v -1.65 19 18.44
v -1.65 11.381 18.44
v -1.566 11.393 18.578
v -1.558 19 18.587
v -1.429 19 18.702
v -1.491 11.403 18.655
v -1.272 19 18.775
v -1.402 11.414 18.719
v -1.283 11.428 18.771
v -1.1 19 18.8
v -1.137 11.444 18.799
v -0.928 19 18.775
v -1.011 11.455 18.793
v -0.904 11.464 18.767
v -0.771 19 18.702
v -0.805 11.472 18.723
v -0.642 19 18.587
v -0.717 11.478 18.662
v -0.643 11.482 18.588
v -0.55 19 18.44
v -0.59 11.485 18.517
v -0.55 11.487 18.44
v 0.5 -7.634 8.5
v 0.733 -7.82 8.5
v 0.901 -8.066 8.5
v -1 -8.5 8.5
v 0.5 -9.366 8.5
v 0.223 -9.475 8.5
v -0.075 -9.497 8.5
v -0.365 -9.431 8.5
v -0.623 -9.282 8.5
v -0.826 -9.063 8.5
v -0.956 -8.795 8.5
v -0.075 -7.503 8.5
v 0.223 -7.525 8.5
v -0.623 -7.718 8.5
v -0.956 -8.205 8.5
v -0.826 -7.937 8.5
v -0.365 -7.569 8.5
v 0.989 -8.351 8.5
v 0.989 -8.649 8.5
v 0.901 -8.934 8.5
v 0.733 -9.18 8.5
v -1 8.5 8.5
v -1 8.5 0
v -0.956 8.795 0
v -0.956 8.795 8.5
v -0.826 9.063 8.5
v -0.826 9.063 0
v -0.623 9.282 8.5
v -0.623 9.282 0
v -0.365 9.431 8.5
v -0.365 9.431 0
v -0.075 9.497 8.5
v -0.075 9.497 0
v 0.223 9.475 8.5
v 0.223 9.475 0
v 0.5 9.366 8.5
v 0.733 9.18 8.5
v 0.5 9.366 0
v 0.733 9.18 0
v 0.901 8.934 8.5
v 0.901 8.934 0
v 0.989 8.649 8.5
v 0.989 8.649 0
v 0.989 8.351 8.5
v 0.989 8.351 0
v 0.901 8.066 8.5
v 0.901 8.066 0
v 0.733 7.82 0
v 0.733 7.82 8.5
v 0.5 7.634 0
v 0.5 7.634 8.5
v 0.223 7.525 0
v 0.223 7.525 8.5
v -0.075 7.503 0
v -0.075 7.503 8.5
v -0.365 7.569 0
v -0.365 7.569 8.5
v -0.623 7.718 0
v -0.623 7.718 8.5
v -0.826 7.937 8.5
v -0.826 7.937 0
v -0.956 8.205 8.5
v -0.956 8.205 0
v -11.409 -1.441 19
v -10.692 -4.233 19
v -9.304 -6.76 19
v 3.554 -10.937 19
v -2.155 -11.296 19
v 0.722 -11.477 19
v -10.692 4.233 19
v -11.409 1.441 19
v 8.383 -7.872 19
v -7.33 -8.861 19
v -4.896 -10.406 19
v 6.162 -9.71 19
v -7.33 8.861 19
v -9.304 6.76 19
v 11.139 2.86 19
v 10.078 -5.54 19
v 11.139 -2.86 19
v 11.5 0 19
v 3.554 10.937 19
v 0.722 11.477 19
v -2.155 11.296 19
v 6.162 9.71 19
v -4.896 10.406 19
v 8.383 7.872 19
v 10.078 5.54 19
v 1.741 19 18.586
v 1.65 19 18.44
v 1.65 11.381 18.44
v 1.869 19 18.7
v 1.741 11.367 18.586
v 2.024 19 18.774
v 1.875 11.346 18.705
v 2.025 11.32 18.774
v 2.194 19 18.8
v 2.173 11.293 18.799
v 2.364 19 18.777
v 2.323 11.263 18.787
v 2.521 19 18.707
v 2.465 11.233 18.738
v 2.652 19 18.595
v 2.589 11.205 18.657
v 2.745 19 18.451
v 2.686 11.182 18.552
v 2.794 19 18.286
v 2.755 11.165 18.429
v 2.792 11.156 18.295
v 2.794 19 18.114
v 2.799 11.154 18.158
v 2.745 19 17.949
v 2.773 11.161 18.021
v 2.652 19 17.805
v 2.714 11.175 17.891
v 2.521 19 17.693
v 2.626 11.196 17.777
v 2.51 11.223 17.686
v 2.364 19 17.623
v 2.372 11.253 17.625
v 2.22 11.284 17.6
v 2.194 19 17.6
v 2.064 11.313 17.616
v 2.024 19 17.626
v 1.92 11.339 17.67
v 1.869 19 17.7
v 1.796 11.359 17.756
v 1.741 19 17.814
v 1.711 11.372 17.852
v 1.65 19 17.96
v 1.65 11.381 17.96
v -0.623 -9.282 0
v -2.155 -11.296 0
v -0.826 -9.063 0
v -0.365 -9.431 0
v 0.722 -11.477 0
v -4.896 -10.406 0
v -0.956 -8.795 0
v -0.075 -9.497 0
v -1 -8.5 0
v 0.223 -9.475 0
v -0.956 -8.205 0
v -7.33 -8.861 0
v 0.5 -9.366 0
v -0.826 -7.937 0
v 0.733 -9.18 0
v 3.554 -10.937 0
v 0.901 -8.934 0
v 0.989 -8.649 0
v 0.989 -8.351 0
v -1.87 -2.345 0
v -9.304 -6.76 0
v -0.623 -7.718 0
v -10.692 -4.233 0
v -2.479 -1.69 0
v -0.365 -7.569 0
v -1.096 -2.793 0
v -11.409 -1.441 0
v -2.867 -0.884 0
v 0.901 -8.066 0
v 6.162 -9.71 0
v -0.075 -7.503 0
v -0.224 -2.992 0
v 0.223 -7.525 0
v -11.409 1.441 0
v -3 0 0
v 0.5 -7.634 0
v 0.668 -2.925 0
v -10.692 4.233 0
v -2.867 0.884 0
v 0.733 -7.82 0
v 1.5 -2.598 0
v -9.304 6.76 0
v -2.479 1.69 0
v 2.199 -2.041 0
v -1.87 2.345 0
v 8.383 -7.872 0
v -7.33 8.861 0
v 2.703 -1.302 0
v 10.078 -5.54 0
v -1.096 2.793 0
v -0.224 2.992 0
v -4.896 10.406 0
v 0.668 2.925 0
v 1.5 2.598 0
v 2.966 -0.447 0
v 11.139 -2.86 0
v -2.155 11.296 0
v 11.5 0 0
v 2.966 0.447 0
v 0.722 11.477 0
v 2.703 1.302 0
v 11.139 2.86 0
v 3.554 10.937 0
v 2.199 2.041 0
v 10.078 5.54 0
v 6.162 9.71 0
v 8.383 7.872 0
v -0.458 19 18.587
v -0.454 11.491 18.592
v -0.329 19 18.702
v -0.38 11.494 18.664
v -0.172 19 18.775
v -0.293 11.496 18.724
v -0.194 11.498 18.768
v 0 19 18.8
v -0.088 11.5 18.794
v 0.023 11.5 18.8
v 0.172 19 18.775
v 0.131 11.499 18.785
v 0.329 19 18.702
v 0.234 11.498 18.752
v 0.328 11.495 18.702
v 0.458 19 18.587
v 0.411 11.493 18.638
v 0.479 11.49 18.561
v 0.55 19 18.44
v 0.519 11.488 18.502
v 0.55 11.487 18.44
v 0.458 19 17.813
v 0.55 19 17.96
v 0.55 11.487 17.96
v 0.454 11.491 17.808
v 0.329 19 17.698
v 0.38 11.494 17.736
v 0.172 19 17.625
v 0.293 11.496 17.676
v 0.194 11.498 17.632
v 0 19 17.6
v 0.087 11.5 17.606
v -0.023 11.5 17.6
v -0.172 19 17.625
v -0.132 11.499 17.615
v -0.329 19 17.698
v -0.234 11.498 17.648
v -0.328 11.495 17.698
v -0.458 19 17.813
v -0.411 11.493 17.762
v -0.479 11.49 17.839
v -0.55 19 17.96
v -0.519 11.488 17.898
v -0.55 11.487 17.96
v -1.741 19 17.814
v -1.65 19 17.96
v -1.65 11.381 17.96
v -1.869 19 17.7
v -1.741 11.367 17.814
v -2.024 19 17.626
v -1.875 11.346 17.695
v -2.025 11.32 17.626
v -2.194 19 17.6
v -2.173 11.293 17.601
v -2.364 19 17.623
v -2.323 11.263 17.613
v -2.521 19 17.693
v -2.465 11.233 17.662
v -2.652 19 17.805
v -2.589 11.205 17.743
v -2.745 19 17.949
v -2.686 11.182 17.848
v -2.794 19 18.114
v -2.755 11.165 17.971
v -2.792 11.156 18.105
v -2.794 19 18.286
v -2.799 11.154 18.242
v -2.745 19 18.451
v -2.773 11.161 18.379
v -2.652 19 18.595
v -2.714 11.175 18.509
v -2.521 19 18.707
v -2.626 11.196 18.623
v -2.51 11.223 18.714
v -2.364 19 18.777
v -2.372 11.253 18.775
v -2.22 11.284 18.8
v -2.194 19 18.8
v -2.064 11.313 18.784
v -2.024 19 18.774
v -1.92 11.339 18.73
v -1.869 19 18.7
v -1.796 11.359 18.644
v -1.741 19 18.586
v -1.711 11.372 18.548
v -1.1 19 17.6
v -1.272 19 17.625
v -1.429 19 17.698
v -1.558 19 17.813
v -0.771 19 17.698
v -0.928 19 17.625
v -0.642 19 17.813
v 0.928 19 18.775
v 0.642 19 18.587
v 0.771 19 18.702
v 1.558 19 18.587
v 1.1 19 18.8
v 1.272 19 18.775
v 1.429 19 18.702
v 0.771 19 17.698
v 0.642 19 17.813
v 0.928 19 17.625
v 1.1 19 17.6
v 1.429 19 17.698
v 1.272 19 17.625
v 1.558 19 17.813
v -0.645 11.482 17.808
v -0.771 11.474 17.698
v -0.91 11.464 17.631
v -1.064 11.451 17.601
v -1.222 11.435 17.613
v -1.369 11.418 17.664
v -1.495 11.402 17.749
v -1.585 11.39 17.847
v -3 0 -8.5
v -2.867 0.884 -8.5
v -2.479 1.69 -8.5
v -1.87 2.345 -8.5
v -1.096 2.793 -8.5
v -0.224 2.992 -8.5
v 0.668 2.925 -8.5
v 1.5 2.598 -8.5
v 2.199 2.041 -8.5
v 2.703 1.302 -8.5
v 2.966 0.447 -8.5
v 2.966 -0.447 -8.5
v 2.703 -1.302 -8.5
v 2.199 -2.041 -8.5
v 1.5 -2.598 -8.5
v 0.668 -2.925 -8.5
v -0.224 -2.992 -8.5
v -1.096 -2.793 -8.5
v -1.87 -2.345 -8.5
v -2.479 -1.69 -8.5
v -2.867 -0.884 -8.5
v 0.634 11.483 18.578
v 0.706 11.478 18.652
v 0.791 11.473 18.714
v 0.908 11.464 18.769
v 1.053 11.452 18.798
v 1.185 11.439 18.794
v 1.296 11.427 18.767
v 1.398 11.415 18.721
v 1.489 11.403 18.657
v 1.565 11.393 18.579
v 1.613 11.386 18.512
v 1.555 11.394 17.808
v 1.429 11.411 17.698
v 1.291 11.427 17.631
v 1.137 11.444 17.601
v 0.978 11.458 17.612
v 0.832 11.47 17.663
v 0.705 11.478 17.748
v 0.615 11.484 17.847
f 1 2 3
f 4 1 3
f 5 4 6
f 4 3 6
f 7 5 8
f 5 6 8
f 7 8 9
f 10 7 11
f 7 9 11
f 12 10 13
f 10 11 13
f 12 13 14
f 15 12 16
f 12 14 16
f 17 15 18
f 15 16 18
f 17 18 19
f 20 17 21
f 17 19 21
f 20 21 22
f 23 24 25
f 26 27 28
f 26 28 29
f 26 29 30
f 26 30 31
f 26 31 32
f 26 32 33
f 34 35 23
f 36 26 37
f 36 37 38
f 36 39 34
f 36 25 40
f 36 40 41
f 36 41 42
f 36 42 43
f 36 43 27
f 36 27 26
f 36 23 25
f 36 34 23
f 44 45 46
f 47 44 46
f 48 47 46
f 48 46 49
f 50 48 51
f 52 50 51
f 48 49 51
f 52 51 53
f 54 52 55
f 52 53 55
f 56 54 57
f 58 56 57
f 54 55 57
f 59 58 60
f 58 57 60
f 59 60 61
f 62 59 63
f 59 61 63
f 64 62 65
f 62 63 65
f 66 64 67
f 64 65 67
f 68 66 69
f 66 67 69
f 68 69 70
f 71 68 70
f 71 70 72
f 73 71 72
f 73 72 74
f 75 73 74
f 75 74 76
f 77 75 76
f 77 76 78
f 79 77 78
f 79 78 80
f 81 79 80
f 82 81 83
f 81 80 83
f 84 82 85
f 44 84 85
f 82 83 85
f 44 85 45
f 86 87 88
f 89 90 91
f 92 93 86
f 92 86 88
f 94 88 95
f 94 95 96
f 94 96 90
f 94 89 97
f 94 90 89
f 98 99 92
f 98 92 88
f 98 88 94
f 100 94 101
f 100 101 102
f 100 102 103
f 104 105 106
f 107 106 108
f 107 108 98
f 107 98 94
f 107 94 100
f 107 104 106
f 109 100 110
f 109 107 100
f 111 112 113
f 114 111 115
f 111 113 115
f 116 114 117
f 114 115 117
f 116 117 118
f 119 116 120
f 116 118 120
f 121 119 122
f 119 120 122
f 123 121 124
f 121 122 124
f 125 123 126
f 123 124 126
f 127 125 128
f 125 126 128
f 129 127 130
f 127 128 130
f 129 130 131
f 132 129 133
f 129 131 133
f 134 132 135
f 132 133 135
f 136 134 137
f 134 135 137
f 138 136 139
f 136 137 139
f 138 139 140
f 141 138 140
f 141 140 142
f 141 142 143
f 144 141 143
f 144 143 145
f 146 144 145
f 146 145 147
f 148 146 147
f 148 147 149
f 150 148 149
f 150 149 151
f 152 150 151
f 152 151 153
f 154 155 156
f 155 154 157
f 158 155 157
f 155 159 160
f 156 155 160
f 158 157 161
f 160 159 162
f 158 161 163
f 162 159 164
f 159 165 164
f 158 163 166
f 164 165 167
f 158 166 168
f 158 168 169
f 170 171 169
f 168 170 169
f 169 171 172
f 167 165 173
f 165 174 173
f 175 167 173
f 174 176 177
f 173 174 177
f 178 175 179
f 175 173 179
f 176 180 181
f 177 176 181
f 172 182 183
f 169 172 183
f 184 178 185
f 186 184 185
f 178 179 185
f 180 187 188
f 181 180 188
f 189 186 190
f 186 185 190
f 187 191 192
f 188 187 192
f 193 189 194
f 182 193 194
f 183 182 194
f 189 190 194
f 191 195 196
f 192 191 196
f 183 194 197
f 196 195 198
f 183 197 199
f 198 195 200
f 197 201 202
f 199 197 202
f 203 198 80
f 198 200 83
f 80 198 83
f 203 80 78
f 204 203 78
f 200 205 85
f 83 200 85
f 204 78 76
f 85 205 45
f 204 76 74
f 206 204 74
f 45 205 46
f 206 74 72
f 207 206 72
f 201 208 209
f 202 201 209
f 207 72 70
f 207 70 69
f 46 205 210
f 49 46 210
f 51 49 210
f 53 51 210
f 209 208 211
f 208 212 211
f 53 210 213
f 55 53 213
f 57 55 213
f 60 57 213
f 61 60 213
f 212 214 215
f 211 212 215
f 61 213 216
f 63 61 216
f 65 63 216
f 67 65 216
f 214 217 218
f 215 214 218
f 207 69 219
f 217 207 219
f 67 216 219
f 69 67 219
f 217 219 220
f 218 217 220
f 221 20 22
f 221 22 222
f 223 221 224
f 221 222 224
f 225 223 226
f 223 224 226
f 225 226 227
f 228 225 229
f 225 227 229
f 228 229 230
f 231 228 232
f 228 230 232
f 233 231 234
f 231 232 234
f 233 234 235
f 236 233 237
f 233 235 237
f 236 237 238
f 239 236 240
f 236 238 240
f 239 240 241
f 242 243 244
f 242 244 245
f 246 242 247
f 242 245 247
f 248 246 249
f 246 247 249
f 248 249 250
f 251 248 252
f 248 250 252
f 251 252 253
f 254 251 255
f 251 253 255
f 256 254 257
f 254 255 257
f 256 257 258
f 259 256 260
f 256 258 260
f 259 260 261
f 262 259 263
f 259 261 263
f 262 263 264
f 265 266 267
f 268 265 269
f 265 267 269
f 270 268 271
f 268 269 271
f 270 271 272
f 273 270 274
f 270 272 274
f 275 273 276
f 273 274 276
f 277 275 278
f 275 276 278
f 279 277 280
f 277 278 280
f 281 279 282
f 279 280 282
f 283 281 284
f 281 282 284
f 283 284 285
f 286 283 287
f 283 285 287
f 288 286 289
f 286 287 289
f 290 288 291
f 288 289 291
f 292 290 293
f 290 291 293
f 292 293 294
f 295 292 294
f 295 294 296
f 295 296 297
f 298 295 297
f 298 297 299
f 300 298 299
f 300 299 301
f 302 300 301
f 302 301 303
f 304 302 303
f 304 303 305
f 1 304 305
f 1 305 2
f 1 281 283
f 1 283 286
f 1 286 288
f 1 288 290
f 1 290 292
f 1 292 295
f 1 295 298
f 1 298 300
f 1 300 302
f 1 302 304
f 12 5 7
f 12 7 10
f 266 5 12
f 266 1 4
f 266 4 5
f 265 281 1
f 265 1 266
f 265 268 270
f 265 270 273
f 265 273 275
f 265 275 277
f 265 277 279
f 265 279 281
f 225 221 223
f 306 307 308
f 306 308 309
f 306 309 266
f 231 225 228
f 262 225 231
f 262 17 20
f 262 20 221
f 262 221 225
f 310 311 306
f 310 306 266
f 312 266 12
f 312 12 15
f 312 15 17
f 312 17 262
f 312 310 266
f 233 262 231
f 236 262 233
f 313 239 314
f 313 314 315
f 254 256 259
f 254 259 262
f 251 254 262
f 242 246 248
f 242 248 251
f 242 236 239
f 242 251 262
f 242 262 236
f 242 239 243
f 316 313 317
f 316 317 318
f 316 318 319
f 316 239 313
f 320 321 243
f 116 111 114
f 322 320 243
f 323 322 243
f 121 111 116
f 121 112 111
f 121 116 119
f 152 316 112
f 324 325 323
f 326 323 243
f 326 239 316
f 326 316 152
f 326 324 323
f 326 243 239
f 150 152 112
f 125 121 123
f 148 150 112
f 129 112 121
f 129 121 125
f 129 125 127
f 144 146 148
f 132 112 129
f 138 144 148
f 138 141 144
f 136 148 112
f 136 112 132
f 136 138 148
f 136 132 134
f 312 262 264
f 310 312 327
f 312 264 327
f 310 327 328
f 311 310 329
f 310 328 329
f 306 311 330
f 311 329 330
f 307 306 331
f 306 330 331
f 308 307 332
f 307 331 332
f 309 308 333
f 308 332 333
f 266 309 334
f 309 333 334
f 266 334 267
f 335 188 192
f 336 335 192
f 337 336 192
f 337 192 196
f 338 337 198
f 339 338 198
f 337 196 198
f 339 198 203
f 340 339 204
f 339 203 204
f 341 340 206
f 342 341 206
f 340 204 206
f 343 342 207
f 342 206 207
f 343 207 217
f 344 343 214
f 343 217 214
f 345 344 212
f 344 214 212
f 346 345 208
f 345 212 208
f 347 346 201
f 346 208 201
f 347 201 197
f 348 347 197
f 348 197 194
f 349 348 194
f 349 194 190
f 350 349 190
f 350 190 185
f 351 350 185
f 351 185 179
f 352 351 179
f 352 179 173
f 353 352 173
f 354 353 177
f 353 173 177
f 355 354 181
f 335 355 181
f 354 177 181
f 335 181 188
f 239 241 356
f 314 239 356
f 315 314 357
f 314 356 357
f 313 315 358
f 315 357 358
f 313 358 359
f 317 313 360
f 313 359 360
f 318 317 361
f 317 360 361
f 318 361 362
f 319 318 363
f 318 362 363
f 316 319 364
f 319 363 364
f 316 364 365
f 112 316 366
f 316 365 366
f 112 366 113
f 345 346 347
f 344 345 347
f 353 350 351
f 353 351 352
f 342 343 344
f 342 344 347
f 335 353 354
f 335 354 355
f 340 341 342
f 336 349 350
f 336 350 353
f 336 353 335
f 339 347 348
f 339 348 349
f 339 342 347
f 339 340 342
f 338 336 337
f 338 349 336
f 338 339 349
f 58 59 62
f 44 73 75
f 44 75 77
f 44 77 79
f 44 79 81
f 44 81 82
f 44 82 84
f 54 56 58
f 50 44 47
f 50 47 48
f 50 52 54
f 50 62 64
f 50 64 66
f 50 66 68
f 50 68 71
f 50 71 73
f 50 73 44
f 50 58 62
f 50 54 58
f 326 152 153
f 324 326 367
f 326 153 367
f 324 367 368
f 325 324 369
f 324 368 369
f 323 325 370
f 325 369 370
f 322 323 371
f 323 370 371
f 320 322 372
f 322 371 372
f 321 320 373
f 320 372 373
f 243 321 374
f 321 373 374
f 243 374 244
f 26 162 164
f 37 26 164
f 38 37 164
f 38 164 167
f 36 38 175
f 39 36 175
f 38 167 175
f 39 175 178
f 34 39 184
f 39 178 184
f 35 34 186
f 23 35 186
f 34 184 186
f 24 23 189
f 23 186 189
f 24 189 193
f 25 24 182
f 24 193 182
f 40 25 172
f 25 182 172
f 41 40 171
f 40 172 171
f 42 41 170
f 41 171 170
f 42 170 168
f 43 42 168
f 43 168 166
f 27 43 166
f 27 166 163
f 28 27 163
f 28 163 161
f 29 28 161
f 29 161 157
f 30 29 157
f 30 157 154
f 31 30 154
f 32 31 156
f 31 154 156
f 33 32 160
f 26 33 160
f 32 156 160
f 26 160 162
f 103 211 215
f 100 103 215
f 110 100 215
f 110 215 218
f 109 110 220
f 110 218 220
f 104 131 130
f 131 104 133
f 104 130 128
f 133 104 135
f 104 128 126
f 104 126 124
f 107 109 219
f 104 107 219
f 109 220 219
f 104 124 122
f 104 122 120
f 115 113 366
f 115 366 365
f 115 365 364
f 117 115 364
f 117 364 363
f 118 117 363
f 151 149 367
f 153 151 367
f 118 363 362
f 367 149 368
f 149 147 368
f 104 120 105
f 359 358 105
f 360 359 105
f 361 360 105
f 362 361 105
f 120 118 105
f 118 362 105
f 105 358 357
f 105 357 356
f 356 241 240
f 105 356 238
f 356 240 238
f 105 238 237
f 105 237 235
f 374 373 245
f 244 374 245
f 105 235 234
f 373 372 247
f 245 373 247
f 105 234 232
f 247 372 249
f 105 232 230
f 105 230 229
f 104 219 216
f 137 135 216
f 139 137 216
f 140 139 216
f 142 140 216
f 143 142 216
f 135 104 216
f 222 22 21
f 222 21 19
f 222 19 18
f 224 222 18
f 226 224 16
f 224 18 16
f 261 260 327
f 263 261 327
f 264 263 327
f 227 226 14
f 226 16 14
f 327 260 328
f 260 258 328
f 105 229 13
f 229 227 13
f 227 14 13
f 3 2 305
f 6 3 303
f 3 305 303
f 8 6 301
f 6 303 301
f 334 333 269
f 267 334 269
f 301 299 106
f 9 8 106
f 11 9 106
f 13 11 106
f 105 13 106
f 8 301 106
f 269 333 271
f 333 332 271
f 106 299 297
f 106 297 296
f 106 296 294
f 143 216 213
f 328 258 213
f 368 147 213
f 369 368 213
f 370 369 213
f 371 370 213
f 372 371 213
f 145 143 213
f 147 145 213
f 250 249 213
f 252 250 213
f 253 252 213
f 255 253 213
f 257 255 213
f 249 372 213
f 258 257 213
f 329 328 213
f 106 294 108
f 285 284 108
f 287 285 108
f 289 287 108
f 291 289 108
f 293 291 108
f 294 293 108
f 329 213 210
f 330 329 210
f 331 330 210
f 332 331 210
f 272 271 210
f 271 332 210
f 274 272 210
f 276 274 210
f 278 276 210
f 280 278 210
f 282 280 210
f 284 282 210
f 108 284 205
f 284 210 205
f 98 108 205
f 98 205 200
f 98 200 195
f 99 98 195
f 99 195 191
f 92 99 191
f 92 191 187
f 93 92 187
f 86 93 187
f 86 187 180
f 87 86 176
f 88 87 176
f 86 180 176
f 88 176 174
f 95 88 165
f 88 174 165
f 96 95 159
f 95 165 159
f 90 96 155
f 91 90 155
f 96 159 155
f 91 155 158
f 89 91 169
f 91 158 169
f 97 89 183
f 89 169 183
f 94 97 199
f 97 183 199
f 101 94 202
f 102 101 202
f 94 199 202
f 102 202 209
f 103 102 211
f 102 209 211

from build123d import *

# Parameters (mm, degrees)
SKETCH1_R           = 11.5
BOSS_EXTRUDE1_DEPTH = 19
SKETCH2_R           = 0.6
BOSS_EXTRUDE4_DEPTH = 19
SKETCH3_R           = 3
BOSS_EXTRUDE5_DEPTH = 8.5
SKETCH4_R           = 1
CUT_EXTRUDE1_DEPTH  = 8.5


with BuildPart() as part:
    # Sketch1 → Boss-Extrude1 (new body)
    with BuildSketch(Plane.XY):
        Circle(SKETCH1_R)
    extrude(amount=BOSS_EXTRUDE1_DEPTH)

    # Sketch2 → Boss-Extrude4 (add)
    with BuildSketch(Plane(origin=(0, 0, 0), x_dir=(1, 0, 0), z_dir=(0, 1, 0))):
        with Locations((-2.2, -18.2)):
            Circle(SKETCH2_R)
        with Locations((-1.1, -18.2)):
            Circle(SKETCH2_R)
        with Locations((0, -18.2)):
            Circle(SKETCH2_R)
        with Locations((1.1, -18.2)):
            Circle(SKETCH2_R)
        with Locations((2.2, -18.2)):
            Circle(SKETCH2_R)
    extrude(amount=BOSS_EXTRUDE4_DEPTH)

    # Sketch3 → Boss-Extrude5 (add)
    with BuildSketch(Plane(origin=(0, 0, 0), x_dir=(-1, 0, 0), z_dir=(0, 0, -1))):
        Circle(SKETCH3_R)
    extrude(amount=BOSS_EXTRUDE5_DEPTH)

    # Sketch4 → Cut-Extrude1 (cut)
    with BuildSketch(Plane(origin=(0, 0, 0), x_dir=(-1, 0, 0), z_dir=(0, 0, -1))):
        with Locations((0, -8.5)):
            Circle(SKETCH4_R)
        with Locations((0, 8.5)):
            Circle(SKETCH4_R)
    extrude(amount=-CUT_EXTRUDE1_DEPTH, mode=Mode.SUBTRACT)


solid = part.part
